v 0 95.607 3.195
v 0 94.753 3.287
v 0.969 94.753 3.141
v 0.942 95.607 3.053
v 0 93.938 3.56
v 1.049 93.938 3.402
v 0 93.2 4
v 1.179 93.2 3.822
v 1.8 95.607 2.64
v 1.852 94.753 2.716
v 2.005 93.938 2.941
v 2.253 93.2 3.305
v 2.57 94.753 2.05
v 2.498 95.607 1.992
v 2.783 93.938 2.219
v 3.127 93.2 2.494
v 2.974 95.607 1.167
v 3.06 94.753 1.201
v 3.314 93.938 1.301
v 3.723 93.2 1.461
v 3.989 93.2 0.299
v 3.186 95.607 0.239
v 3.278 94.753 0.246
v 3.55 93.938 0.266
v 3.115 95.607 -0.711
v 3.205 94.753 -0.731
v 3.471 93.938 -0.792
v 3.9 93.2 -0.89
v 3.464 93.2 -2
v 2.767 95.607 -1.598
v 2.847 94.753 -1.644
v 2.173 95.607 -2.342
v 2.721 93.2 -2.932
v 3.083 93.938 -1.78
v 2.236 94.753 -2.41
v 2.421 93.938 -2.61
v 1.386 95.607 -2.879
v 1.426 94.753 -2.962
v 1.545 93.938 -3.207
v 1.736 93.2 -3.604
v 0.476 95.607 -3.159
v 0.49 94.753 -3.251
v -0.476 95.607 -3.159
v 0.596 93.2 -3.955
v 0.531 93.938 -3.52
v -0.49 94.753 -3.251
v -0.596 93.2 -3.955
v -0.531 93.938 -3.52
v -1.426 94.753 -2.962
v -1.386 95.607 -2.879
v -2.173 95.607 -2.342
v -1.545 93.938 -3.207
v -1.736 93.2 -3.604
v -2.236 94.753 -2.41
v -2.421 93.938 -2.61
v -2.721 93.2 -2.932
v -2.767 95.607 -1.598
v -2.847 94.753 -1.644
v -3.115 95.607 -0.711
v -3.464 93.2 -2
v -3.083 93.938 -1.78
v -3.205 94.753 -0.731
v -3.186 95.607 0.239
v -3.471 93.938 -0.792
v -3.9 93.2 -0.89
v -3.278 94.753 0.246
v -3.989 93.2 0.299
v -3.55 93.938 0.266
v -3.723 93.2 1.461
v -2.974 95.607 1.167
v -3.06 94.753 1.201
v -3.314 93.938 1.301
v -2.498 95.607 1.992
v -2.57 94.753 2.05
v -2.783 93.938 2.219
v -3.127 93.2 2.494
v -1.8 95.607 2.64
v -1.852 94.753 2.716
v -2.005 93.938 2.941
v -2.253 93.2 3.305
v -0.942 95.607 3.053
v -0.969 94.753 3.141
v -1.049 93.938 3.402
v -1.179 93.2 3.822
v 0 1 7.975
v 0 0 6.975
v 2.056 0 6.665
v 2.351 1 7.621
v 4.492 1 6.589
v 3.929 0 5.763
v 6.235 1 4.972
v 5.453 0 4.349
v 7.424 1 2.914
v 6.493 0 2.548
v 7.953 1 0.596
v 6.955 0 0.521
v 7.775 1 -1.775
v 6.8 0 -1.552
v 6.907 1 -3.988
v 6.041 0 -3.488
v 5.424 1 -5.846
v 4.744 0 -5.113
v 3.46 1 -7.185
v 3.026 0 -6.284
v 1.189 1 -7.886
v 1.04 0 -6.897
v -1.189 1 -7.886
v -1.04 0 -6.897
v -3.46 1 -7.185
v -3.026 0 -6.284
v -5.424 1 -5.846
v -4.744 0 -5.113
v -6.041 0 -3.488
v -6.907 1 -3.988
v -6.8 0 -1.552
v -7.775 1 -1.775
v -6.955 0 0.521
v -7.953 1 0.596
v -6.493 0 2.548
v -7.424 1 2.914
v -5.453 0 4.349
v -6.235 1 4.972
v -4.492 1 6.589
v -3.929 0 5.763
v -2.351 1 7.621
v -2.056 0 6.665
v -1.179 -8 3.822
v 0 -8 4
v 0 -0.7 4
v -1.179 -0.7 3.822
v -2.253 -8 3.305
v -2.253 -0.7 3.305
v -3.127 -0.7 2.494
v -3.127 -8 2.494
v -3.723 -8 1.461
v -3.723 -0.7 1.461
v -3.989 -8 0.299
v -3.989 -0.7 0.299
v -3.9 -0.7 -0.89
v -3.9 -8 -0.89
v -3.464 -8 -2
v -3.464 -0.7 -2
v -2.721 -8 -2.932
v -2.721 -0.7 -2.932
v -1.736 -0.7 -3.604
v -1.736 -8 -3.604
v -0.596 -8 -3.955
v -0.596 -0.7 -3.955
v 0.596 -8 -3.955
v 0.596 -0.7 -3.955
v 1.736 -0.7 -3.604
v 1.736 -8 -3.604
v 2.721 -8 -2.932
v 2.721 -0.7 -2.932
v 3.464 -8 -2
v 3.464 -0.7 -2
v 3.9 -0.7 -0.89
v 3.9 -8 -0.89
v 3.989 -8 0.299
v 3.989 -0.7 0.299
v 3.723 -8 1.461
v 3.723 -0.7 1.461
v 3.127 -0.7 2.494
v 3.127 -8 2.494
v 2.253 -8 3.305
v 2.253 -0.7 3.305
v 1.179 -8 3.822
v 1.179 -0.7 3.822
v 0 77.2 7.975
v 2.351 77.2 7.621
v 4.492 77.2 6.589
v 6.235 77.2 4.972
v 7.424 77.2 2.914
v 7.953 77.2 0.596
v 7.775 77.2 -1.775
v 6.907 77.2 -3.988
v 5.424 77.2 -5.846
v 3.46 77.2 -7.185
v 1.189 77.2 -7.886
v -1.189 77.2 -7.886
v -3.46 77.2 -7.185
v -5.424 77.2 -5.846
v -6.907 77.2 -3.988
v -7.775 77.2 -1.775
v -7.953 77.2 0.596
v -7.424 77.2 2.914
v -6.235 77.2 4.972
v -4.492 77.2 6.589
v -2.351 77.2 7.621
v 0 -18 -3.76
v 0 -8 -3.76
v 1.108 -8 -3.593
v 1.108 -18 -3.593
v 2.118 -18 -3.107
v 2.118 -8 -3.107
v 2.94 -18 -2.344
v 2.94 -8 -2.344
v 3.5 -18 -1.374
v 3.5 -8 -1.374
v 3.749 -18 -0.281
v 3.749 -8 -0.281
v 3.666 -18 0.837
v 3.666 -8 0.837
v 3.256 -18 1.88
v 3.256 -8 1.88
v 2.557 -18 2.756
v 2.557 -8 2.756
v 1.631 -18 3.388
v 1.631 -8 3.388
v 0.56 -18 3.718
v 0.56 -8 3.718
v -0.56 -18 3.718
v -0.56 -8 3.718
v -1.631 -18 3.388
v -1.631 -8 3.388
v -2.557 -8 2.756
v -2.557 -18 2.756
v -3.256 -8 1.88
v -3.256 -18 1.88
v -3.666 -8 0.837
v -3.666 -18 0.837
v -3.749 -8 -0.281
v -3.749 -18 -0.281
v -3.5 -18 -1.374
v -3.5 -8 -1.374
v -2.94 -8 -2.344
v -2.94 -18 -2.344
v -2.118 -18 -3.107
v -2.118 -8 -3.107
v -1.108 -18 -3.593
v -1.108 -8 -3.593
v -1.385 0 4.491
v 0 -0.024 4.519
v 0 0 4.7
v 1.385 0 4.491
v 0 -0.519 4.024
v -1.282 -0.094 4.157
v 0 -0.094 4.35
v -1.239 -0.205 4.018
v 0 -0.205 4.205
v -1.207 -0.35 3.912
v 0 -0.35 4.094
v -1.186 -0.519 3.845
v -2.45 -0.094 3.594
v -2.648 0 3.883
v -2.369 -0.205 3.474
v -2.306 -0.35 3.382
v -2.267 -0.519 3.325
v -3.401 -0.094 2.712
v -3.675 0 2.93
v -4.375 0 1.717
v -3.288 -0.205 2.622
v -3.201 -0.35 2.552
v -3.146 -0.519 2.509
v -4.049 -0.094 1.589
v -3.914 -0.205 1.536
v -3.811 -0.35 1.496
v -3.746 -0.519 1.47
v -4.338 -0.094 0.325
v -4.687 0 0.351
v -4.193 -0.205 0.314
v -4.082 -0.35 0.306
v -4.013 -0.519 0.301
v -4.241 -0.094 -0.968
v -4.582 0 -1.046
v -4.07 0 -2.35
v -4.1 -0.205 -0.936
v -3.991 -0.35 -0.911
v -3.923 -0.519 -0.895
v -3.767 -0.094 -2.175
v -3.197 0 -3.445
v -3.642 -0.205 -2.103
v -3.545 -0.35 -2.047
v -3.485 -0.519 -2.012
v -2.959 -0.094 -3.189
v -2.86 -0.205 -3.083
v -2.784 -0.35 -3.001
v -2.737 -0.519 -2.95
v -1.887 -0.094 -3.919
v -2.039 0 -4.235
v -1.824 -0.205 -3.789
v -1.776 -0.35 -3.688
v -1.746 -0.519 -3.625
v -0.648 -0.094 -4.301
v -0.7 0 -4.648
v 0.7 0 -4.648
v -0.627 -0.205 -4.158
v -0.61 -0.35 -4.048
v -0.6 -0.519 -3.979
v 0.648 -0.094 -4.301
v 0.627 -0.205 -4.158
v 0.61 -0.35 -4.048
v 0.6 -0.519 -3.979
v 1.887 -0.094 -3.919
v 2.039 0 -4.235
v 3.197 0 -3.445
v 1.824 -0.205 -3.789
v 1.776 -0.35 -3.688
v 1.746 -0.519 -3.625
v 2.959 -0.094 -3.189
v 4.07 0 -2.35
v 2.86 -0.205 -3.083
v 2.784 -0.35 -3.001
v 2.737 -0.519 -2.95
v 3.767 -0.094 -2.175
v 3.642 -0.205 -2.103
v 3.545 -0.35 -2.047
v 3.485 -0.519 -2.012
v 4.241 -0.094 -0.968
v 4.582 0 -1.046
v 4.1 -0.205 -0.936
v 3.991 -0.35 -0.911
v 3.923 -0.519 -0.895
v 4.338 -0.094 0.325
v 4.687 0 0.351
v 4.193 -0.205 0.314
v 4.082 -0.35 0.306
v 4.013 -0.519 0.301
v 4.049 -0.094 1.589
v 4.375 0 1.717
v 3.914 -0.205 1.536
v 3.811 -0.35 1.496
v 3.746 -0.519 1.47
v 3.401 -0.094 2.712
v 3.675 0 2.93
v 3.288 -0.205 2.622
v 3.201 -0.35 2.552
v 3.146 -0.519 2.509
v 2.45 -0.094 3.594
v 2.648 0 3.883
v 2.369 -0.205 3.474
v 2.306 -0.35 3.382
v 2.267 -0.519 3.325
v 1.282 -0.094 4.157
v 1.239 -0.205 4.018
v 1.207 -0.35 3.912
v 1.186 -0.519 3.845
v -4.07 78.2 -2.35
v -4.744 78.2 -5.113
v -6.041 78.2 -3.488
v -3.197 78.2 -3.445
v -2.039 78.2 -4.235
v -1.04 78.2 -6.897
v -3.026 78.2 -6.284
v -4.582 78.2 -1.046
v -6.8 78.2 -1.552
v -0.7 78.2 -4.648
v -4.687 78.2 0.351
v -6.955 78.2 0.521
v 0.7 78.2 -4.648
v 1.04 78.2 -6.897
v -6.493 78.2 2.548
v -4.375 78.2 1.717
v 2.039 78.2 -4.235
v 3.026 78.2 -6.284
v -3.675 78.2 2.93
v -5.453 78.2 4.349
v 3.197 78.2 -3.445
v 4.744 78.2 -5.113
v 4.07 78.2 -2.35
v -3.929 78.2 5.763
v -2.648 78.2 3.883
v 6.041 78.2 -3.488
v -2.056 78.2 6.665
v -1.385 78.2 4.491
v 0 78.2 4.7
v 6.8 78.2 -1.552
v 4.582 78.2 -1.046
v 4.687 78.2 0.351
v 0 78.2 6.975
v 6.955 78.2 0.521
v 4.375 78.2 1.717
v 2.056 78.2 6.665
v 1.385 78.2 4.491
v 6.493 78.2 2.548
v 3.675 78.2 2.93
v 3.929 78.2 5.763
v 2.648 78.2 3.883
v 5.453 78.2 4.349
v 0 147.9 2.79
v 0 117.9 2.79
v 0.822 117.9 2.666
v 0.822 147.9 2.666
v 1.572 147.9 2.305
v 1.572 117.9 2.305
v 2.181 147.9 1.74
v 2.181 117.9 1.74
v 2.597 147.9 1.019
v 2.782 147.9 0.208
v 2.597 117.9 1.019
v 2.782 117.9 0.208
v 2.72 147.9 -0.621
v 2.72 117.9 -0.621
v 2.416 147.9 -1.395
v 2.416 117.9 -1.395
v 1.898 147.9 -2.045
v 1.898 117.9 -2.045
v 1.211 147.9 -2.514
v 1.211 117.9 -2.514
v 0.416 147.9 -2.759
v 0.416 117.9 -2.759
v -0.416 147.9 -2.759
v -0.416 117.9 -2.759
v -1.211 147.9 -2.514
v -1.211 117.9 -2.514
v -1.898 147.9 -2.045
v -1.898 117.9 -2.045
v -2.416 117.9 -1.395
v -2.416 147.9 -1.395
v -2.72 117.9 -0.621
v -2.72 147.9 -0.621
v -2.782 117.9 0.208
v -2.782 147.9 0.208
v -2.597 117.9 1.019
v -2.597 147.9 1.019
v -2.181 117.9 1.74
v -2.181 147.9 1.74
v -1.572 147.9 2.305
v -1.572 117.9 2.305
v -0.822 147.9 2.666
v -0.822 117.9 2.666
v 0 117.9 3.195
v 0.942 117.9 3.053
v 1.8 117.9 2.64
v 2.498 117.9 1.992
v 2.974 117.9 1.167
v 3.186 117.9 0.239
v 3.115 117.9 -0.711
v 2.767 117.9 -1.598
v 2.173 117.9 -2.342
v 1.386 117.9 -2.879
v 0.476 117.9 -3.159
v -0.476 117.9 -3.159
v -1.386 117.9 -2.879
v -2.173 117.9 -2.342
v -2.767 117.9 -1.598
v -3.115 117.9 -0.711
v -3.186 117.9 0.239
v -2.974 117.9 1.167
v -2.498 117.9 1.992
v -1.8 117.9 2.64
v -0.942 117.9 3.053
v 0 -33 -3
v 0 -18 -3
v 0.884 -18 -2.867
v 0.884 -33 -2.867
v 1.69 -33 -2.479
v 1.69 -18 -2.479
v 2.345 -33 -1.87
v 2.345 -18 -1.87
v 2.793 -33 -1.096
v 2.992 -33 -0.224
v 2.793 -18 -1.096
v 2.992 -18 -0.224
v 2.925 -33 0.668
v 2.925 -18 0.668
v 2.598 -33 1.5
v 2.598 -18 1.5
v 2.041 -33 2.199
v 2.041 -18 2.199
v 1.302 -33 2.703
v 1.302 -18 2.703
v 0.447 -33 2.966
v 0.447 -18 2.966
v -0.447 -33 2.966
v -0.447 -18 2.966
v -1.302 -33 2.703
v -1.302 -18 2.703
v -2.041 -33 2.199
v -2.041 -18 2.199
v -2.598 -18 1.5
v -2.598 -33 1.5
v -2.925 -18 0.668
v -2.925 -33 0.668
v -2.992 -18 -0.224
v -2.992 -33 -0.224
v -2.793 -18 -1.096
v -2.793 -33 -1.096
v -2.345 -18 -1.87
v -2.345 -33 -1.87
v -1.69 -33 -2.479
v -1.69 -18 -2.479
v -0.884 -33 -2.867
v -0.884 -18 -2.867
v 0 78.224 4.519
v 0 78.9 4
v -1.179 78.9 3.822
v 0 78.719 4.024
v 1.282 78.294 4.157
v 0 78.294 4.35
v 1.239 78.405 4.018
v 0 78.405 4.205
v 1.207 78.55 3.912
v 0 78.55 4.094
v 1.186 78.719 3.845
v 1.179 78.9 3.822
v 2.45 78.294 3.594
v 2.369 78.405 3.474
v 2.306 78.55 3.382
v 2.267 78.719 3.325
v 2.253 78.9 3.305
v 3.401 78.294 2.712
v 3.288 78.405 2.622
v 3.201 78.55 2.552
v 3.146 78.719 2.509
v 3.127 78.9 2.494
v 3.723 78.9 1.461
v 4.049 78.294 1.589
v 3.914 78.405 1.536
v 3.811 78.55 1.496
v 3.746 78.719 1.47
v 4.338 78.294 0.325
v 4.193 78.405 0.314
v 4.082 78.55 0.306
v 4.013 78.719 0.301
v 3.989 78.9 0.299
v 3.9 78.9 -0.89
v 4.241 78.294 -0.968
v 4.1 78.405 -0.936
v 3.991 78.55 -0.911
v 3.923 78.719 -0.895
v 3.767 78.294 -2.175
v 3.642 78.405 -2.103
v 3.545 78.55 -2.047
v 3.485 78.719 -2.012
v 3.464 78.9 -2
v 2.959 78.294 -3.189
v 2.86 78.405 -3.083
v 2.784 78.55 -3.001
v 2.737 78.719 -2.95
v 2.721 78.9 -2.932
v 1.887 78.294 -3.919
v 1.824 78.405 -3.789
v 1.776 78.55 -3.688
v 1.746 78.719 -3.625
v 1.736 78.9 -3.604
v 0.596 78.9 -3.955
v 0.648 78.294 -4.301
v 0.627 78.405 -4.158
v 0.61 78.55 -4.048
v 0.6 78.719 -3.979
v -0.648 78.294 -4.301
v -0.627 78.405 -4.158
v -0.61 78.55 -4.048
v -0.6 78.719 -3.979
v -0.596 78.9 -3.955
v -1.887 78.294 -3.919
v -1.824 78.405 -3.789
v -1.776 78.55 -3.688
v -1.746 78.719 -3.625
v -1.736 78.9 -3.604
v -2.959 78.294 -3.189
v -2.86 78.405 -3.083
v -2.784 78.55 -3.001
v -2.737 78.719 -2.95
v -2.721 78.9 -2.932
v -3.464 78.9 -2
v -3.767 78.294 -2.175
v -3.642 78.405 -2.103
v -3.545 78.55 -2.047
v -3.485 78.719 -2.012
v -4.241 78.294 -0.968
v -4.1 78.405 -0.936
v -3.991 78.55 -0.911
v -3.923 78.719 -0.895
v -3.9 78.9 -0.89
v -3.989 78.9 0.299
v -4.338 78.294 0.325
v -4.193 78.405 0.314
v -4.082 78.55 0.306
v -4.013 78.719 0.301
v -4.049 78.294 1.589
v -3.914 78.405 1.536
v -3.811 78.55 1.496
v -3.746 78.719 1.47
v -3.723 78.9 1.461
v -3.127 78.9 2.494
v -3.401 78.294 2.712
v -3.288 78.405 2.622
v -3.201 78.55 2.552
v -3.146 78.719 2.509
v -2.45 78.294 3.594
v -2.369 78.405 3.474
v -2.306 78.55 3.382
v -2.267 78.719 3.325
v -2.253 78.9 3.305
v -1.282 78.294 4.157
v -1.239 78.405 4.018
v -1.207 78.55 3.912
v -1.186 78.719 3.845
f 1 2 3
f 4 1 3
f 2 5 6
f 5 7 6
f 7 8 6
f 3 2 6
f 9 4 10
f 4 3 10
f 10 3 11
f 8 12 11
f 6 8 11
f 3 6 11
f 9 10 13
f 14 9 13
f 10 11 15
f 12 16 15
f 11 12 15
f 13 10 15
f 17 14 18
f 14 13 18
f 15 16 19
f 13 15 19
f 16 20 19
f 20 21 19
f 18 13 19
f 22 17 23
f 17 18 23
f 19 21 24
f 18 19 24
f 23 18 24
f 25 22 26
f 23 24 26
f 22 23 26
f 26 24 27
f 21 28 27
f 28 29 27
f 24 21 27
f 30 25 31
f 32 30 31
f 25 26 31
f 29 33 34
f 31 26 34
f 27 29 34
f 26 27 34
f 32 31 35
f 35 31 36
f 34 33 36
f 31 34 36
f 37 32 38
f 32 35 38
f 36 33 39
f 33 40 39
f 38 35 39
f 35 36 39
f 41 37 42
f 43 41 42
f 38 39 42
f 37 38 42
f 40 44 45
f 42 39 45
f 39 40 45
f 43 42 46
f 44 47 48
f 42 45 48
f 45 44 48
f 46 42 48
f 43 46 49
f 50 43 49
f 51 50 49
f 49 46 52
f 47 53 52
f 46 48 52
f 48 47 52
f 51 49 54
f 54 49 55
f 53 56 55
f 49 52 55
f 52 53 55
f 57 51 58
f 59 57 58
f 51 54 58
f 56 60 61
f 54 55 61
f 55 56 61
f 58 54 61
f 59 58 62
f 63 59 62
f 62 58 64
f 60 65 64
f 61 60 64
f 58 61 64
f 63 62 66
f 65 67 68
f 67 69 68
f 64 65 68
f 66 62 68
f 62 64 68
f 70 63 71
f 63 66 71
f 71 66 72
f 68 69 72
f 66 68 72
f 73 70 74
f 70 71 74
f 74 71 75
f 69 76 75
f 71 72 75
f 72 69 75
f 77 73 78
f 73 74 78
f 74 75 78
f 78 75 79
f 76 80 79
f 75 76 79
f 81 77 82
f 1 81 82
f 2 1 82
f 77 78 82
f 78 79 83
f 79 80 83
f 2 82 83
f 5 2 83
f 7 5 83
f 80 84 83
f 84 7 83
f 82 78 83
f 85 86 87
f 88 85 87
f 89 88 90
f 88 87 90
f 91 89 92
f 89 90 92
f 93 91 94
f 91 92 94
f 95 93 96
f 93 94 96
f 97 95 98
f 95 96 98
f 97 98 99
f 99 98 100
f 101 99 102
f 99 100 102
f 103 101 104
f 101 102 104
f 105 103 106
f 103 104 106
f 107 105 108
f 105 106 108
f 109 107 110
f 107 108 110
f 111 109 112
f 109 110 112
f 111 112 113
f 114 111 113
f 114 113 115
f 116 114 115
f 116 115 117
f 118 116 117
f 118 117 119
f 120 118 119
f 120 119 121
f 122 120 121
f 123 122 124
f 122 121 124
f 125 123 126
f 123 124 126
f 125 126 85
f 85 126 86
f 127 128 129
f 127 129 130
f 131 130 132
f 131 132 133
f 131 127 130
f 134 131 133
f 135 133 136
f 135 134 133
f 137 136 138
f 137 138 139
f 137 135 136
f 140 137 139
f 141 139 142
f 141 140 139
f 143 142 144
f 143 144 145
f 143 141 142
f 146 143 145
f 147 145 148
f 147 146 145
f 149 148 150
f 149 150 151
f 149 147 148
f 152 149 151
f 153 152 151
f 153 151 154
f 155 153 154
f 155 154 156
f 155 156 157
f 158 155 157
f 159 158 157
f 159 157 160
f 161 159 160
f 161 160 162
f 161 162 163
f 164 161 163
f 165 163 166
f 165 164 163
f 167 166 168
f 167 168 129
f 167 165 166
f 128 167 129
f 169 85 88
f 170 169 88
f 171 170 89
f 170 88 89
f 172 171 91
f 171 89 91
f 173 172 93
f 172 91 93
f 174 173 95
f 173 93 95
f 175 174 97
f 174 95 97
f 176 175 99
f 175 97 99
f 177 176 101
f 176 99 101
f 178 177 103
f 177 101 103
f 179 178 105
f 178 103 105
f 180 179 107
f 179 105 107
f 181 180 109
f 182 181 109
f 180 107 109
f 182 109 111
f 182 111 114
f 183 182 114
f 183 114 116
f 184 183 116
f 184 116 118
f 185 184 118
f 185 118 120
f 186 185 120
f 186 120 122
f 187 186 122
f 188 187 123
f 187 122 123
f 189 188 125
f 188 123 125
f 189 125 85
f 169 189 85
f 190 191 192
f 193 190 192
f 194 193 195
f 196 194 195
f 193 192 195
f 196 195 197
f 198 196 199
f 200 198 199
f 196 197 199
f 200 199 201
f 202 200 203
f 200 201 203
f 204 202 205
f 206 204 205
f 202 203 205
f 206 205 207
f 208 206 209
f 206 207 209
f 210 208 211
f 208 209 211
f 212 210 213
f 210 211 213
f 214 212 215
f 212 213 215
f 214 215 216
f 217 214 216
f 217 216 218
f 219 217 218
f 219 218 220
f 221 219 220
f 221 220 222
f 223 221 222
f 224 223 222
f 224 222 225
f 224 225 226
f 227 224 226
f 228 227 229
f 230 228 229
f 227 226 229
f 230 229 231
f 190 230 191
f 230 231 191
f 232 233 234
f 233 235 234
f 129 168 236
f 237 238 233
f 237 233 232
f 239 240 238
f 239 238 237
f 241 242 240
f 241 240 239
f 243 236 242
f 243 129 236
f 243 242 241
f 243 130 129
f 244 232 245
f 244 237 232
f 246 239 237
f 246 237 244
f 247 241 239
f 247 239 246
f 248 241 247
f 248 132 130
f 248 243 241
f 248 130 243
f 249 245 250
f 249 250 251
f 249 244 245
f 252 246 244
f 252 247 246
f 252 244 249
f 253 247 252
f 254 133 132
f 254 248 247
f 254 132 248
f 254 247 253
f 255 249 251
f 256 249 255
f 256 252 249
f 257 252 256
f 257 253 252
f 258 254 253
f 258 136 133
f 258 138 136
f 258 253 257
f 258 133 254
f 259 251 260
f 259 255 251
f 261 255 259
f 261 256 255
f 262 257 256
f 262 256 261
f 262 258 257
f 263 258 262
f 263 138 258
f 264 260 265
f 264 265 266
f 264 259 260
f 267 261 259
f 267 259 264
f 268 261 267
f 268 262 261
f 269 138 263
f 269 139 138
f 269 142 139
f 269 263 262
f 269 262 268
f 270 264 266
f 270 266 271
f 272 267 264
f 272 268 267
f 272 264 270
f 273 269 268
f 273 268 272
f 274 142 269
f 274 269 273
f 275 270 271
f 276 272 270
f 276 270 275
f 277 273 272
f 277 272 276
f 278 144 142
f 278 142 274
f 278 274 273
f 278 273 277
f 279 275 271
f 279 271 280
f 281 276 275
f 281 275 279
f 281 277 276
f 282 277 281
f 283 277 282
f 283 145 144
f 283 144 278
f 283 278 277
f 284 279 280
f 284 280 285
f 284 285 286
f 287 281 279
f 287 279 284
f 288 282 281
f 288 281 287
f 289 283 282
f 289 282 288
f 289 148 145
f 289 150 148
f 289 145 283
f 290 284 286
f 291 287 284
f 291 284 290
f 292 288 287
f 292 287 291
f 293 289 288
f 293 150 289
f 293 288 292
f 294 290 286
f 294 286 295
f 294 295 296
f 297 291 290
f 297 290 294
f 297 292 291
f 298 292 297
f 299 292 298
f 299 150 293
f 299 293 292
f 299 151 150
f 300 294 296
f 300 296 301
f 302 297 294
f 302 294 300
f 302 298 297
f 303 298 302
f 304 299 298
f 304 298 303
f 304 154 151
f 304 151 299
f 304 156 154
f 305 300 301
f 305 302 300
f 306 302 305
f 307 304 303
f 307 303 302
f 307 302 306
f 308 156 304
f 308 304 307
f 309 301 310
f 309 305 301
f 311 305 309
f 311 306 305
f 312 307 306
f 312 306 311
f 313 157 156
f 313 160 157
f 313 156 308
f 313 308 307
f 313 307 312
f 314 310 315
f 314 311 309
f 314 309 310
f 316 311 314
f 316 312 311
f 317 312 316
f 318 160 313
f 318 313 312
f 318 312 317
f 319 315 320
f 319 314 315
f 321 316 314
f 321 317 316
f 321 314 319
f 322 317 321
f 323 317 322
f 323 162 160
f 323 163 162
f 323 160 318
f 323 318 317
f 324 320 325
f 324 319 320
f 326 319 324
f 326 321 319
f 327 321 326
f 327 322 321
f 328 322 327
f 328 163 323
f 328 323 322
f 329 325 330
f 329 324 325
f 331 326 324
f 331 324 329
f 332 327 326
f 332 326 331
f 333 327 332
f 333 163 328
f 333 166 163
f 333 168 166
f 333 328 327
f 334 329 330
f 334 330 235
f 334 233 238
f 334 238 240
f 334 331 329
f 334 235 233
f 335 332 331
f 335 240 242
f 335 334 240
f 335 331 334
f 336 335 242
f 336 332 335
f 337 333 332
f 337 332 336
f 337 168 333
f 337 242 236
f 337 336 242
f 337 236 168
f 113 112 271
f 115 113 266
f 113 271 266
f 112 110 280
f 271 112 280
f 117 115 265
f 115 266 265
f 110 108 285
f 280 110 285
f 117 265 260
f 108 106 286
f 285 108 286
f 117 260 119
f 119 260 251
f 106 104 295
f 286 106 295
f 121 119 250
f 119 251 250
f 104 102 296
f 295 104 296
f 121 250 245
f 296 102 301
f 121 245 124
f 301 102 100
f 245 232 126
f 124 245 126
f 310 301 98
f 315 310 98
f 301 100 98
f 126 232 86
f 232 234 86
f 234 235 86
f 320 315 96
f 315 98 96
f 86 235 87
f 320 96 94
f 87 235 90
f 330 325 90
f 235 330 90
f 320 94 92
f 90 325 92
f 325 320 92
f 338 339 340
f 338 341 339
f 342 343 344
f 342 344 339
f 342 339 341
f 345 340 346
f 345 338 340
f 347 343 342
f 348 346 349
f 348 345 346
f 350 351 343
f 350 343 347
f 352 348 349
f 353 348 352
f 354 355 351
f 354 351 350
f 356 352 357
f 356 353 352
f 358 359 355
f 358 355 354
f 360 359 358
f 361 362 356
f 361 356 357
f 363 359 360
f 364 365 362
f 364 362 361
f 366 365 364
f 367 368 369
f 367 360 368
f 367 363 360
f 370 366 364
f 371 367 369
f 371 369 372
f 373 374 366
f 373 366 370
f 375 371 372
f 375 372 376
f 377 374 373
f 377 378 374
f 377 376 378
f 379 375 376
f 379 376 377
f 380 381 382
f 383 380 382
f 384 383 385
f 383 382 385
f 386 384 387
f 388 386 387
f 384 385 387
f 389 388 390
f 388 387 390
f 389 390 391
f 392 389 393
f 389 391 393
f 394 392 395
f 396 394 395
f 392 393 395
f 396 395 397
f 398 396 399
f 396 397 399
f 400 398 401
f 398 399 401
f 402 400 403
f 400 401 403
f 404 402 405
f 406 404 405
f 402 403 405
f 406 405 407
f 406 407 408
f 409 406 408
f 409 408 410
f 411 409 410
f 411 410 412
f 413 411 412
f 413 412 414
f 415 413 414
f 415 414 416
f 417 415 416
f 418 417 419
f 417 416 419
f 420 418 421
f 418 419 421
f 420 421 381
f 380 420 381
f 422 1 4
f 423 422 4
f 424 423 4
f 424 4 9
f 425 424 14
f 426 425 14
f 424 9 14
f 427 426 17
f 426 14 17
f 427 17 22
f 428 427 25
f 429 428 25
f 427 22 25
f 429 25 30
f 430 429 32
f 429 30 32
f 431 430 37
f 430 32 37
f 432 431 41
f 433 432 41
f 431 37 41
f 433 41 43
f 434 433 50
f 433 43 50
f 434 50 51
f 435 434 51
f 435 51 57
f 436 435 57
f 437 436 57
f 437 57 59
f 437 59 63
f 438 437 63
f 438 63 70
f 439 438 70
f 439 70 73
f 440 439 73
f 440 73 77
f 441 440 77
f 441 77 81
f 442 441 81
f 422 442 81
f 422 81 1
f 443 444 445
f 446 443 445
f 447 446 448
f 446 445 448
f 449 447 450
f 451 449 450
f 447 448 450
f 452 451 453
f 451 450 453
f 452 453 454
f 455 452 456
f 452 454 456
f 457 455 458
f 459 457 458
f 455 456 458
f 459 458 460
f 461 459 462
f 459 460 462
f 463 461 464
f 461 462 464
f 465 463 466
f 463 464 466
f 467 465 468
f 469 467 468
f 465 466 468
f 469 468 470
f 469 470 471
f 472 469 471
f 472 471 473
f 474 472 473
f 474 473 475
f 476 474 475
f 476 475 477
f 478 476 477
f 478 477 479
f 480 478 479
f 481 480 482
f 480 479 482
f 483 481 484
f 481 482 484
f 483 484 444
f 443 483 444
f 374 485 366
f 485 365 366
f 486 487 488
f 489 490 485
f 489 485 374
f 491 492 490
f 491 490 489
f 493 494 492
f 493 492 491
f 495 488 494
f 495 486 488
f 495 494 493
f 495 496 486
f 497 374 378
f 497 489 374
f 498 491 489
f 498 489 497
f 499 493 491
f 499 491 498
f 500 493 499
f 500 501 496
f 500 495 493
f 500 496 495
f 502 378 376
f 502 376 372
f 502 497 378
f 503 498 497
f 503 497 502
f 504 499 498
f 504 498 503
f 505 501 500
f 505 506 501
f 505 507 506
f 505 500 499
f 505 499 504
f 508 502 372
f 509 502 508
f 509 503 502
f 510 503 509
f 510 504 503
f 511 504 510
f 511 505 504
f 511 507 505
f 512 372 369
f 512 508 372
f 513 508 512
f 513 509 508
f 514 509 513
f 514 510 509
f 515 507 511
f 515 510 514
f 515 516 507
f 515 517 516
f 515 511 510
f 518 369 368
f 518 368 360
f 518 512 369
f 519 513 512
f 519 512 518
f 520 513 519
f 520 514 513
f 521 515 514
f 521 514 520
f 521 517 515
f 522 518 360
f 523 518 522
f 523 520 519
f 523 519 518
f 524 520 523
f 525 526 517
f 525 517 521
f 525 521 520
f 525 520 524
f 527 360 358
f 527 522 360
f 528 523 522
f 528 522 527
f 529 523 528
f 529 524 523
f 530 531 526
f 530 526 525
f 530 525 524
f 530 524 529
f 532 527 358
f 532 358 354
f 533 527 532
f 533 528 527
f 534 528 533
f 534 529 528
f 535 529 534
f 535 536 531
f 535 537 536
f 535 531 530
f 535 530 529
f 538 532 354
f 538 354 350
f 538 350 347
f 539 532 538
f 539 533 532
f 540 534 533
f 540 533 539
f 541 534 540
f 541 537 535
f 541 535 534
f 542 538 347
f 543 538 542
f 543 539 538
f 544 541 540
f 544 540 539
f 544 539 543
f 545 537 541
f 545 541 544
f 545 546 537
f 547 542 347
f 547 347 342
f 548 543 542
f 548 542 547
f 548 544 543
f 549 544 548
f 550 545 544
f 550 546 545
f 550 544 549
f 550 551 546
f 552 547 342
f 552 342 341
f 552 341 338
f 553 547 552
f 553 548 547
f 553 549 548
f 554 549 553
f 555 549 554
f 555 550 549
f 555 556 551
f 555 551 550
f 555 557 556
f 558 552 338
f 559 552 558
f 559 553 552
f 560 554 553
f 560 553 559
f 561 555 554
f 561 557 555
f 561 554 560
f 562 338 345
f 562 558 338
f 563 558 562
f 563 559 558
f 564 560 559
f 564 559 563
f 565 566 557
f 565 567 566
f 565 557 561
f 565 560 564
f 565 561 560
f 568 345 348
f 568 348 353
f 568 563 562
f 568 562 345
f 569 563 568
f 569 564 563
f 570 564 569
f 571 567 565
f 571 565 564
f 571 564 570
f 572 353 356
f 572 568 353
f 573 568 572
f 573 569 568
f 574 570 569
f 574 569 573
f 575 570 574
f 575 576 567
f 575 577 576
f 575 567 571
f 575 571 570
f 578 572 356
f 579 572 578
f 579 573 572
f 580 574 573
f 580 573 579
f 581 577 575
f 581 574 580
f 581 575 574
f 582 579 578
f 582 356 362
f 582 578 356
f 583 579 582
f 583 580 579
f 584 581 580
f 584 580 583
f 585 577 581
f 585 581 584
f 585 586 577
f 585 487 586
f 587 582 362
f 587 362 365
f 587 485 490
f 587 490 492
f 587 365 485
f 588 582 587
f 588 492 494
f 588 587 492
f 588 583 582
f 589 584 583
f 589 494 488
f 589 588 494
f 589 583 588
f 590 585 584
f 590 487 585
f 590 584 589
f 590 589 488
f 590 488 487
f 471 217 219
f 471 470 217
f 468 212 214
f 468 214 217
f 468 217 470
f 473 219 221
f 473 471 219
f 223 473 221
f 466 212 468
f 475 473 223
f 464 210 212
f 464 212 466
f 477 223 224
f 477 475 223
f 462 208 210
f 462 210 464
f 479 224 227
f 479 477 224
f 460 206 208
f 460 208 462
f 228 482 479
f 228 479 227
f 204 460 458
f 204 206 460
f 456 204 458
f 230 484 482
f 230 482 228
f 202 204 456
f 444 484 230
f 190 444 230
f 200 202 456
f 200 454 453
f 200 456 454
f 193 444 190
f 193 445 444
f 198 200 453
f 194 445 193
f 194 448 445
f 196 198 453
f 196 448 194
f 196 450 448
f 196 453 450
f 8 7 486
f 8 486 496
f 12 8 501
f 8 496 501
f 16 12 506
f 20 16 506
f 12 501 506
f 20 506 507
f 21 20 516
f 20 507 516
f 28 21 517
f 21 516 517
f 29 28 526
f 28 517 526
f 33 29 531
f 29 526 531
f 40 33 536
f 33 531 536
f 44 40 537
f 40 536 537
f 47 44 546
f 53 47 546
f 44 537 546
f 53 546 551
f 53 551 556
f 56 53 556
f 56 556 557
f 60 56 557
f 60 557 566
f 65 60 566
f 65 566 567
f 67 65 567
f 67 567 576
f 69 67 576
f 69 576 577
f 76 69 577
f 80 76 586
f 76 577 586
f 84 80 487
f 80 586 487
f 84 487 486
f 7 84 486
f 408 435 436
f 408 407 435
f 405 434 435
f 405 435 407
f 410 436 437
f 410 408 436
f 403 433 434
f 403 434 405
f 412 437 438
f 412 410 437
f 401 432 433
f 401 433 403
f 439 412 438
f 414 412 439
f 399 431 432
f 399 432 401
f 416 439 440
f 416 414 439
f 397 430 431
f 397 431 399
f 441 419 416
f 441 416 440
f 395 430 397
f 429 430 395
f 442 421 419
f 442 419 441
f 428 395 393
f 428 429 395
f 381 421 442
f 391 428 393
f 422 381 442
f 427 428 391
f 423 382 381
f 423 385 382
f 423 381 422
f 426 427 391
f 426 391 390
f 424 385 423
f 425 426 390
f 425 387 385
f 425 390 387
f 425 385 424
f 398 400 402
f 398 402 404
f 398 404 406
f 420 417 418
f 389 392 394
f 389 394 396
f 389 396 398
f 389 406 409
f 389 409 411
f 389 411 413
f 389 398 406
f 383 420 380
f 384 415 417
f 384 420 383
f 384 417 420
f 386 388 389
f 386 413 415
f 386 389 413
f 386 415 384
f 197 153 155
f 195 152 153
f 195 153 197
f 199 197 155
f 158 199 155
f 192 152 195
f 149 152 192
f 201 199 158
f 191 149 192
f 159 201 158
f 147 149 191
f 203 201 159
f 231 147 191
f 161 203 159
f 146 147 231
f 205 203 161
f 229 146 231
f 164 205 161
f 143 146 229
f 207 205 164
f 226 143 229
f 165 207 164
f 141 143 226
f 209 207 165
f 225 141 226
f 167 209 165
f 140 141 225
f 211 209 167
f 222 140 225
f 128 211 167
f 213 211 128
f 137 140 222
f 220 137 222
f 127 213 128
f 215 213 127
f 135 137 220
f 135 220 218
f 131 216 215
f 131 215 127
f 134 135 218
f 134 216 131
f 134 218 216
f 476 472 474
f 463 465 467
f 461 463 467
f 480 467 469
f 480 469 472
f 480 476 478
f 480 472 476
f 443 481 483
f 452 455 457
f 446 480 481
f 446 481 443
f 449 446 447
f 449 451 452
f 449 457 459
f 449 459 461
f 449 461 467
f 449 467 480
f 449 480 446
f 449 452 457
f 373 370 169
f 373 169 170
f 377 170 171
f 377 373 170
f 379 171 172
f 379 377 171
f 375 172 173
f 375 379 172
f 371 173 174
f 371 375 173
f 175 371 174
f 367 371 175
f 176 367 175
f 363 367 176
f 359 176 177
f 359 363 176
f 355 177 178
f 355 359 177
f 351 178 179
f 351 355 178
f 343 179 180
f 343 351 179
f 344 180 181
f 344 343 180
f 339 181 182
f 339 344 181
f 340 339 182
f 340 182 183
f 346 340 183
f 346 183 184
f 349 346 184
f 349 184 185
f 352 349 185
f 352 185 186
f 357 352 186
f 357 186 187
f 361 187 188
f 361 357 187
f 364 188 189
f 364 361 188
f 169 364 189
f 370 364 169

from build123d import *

# Parameters (mm, degrees)
SKETCH1_R           = 7.975
BOSS_EXTRUDE1_DEPTH = 78.2
SKETCH2_R           = 4
BOSS_EXTRUDE2_DEPTH = 15
BOSS_EXTRUDE3_START = 8
SKETCH3_R           = 4
BOSS_EXTRUDE3_DEPTH = 8
SKETCH4_R           = 3.195
BOSS_EXTRUDE4_DEPTH = 24.7
SKETCH5_R           = 2.79
BOSS_EXTRUDE5_DEPTH = 30
BOSS_EXTRUDE7_START = 8
SKETCH3_2_R         = 4
BOSS_EXTRUDE7_DEPTH = 8
SKETCH11_R          = 3.76
BOSS_EXTRUDE8_DEPTH = 10
SKETCH12_R          = 3
BOSS_EXTRUDE9_DEPTH = 15
CHAMFER6_SIZE       = 1
CHAMFER7_SIZE       = 1
FILLET1_R           = 0.7
FILLET3_R           = 0.7
FILLET4_R           = 4


with BuildPart() as part:
    # Sketch1 → Boss-Extrude1 (new body)
    with BuildSketch(Plane(origin=(0, 0, 0), x_dir=(1, 0, 0), z_dir=(0, 1, 0))):
        with Locations(Location((0, 0, 0), (0, 0, 270))):
            Circle(SKETCH1_R)
    extrude(amount=BOSS_EXTRUDE1_DEPTH)

    # Sketch2 → Boss-Extrude2 (add)
    with BuildSketch(Plane(origin=(0, 78.2, 0), x_dir=(1, 0, 0), z_dir=(0, 1, 0))):
        with Locations(Location((0, 0, 0), (0, 0, 270))):
            Circle(SKETCH2_R)
    extrude(amount=BOSS_EXTRUDE2_DEPTH)

    # Sketch3 → Boss-Extrude3 (add)
    with BuildSketch(Plane.XZ.offset(BOSS_EXTRUDE3_START)):
        with Locations(Location((0, 0, 0), (0, 0, 90))):
            Circle(SKETCH3_R)
    extrude(amount=-BOSS_EXTRUDE3_DEPTH)

    # Sketch4 → Boss-Extrude4 (add)
    with BuildSketch(Plane(origin=(0, 93.2, 0), x_dir=(1, 0, 0), z_dir=(0, 1, 0))):
        with Locations(Location((0, 0, 0), (0, 0, 270))):
            Circle(SKETCH4_R)
    extrude(amount=BOSS_EXTRUDE4_DEPTH)

    # Sketch5 → Boss-Extrude5 (add)
    with BuildSketch(Plane(origin=(0, 117.9, 0), x_dir=(1, 0, 0), z_dir=(0, 1, 0))):
        with Locations(Location((0, 0, 0), (0, 0, 270))):
            Circle(SKETCH5_R)
    extrude(amount=BOSS_EXTRUDE5_DEPTH)

    # Sketch3<2> → Boss-Extrude7 (add)
    with BuildSketch(Plane.XZ.offset(BOSS_EXTRUDE7_START)):
        with Locations(Location((0, 0, 0), (0, 0, 90))):
            Circle(SKETCH3_2_R)
    extrude(amount=-BOSS_EXTRUDE7_DEPTH)

    # Sketch11 → Boss-Extrude8 (add)
    with BuildSketch(Plane.XZ.offset(8)):
        with Locations(Location((0, 0, 0), (0, 0, 270))):
            Circle(SKETCH11_R)
    extrude(amount=BOSS_EXTRUDE8_DEPTH)

    # Sketch12 → Boss-Extrude9 (add)
    with BuildSketch(Plane.XZ.offset(18)):
        with Locations(Location((0, 0, 0), (0, 0, 270))):
            Circle(SKETCH12_R)
    extrude(amount=BOSS_EXTRUDE9_DEPTH)

    # Chamfer6
    chamfer6_edges = [part.edges().sort_by_distance(p)[0] for p in [
        (0, 78.2, -7.975),
    ]]
    chamfer(chamfer6_edges, length=CHAMFER6_SIZE)

    # Chamfer7
    chamfer7_edges = [part.edges().sort_by_distance(p)[0] for p in [
        (0, 0, -7.975),
    ]]
    chamfer(chamfer7_edges, length=CHAMFER7_SIZE)

    # Fillet1
    fillet1_edges = [part.edges().sort_by_distance(p)[0] for p in [
        (0, 78.2, -4),
    ]]
    fillet(fillet1_edges, radius=FILLET1_R)

    # Fillet3
    fillet3_edges = [part.edges().sort_by_distance(p)[0] for p in [
        (0, 0, -4),
    ]]
    fillet(fillet3_edges, radius=FILLET3_R)

    # Fillet4
    # the kernel refuses this fillet: 4 mm, written as the material it adds along each edge
    with BuildSketch(Plane(origin=(0, 93.2, 0), x_dir=(0, 0, 1), z_dir=(-1, 0, 0))) as fillet4_piece_1:
        with BuildLine():
            CenterArc((7.195, 2.406652239), FILLET4_R, 180, 36.989098612)
            Line((3.195, 2.406652239), (3.115, 2.406652239))
            Line((3.115, 2.406652239), (3.115, 0))
            Line((3.115, 0), (3.195, -0.08))
            ThreePointArc((3.195, -0.08), (3.5975, -0.08), (3.9361, -0.048133045))
            Line((3.9361, -0.048133045), (4, 0))
        make_face()
    revolve(axis=Axis((0, 93.2, 0), (0, 1, 0)))


solid = part.part
